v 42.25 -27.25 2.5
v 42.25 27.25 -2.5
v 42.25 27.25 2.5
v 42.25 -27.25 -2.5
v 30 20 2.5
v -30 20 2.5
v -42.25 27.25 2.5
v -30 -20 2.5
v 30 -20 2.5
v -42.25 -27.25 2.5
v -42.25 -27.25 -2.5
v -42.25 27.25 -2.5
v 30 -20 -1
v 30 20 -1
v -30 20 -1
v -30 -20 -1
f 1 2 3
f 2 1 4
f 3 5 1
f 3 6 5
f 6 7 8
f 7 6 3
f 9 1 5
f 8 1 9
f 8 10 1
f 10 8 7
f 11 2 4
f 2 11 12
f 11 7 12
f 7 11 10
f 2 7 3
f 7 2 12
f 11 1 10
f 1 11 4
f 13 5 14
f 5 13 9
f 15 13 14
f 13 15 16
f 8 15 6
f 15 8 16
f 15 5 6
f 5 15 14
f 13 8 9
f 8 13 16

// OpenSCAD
module display_module() {
    difference() {
        // Main body of the display
        cube([84.5, 54.5, 5], center=true);
        
        // Cutout for the screen
        translate([-30, -20, -1])
            cube([60, 40, 6], center=false);
    }
}

display_module();
